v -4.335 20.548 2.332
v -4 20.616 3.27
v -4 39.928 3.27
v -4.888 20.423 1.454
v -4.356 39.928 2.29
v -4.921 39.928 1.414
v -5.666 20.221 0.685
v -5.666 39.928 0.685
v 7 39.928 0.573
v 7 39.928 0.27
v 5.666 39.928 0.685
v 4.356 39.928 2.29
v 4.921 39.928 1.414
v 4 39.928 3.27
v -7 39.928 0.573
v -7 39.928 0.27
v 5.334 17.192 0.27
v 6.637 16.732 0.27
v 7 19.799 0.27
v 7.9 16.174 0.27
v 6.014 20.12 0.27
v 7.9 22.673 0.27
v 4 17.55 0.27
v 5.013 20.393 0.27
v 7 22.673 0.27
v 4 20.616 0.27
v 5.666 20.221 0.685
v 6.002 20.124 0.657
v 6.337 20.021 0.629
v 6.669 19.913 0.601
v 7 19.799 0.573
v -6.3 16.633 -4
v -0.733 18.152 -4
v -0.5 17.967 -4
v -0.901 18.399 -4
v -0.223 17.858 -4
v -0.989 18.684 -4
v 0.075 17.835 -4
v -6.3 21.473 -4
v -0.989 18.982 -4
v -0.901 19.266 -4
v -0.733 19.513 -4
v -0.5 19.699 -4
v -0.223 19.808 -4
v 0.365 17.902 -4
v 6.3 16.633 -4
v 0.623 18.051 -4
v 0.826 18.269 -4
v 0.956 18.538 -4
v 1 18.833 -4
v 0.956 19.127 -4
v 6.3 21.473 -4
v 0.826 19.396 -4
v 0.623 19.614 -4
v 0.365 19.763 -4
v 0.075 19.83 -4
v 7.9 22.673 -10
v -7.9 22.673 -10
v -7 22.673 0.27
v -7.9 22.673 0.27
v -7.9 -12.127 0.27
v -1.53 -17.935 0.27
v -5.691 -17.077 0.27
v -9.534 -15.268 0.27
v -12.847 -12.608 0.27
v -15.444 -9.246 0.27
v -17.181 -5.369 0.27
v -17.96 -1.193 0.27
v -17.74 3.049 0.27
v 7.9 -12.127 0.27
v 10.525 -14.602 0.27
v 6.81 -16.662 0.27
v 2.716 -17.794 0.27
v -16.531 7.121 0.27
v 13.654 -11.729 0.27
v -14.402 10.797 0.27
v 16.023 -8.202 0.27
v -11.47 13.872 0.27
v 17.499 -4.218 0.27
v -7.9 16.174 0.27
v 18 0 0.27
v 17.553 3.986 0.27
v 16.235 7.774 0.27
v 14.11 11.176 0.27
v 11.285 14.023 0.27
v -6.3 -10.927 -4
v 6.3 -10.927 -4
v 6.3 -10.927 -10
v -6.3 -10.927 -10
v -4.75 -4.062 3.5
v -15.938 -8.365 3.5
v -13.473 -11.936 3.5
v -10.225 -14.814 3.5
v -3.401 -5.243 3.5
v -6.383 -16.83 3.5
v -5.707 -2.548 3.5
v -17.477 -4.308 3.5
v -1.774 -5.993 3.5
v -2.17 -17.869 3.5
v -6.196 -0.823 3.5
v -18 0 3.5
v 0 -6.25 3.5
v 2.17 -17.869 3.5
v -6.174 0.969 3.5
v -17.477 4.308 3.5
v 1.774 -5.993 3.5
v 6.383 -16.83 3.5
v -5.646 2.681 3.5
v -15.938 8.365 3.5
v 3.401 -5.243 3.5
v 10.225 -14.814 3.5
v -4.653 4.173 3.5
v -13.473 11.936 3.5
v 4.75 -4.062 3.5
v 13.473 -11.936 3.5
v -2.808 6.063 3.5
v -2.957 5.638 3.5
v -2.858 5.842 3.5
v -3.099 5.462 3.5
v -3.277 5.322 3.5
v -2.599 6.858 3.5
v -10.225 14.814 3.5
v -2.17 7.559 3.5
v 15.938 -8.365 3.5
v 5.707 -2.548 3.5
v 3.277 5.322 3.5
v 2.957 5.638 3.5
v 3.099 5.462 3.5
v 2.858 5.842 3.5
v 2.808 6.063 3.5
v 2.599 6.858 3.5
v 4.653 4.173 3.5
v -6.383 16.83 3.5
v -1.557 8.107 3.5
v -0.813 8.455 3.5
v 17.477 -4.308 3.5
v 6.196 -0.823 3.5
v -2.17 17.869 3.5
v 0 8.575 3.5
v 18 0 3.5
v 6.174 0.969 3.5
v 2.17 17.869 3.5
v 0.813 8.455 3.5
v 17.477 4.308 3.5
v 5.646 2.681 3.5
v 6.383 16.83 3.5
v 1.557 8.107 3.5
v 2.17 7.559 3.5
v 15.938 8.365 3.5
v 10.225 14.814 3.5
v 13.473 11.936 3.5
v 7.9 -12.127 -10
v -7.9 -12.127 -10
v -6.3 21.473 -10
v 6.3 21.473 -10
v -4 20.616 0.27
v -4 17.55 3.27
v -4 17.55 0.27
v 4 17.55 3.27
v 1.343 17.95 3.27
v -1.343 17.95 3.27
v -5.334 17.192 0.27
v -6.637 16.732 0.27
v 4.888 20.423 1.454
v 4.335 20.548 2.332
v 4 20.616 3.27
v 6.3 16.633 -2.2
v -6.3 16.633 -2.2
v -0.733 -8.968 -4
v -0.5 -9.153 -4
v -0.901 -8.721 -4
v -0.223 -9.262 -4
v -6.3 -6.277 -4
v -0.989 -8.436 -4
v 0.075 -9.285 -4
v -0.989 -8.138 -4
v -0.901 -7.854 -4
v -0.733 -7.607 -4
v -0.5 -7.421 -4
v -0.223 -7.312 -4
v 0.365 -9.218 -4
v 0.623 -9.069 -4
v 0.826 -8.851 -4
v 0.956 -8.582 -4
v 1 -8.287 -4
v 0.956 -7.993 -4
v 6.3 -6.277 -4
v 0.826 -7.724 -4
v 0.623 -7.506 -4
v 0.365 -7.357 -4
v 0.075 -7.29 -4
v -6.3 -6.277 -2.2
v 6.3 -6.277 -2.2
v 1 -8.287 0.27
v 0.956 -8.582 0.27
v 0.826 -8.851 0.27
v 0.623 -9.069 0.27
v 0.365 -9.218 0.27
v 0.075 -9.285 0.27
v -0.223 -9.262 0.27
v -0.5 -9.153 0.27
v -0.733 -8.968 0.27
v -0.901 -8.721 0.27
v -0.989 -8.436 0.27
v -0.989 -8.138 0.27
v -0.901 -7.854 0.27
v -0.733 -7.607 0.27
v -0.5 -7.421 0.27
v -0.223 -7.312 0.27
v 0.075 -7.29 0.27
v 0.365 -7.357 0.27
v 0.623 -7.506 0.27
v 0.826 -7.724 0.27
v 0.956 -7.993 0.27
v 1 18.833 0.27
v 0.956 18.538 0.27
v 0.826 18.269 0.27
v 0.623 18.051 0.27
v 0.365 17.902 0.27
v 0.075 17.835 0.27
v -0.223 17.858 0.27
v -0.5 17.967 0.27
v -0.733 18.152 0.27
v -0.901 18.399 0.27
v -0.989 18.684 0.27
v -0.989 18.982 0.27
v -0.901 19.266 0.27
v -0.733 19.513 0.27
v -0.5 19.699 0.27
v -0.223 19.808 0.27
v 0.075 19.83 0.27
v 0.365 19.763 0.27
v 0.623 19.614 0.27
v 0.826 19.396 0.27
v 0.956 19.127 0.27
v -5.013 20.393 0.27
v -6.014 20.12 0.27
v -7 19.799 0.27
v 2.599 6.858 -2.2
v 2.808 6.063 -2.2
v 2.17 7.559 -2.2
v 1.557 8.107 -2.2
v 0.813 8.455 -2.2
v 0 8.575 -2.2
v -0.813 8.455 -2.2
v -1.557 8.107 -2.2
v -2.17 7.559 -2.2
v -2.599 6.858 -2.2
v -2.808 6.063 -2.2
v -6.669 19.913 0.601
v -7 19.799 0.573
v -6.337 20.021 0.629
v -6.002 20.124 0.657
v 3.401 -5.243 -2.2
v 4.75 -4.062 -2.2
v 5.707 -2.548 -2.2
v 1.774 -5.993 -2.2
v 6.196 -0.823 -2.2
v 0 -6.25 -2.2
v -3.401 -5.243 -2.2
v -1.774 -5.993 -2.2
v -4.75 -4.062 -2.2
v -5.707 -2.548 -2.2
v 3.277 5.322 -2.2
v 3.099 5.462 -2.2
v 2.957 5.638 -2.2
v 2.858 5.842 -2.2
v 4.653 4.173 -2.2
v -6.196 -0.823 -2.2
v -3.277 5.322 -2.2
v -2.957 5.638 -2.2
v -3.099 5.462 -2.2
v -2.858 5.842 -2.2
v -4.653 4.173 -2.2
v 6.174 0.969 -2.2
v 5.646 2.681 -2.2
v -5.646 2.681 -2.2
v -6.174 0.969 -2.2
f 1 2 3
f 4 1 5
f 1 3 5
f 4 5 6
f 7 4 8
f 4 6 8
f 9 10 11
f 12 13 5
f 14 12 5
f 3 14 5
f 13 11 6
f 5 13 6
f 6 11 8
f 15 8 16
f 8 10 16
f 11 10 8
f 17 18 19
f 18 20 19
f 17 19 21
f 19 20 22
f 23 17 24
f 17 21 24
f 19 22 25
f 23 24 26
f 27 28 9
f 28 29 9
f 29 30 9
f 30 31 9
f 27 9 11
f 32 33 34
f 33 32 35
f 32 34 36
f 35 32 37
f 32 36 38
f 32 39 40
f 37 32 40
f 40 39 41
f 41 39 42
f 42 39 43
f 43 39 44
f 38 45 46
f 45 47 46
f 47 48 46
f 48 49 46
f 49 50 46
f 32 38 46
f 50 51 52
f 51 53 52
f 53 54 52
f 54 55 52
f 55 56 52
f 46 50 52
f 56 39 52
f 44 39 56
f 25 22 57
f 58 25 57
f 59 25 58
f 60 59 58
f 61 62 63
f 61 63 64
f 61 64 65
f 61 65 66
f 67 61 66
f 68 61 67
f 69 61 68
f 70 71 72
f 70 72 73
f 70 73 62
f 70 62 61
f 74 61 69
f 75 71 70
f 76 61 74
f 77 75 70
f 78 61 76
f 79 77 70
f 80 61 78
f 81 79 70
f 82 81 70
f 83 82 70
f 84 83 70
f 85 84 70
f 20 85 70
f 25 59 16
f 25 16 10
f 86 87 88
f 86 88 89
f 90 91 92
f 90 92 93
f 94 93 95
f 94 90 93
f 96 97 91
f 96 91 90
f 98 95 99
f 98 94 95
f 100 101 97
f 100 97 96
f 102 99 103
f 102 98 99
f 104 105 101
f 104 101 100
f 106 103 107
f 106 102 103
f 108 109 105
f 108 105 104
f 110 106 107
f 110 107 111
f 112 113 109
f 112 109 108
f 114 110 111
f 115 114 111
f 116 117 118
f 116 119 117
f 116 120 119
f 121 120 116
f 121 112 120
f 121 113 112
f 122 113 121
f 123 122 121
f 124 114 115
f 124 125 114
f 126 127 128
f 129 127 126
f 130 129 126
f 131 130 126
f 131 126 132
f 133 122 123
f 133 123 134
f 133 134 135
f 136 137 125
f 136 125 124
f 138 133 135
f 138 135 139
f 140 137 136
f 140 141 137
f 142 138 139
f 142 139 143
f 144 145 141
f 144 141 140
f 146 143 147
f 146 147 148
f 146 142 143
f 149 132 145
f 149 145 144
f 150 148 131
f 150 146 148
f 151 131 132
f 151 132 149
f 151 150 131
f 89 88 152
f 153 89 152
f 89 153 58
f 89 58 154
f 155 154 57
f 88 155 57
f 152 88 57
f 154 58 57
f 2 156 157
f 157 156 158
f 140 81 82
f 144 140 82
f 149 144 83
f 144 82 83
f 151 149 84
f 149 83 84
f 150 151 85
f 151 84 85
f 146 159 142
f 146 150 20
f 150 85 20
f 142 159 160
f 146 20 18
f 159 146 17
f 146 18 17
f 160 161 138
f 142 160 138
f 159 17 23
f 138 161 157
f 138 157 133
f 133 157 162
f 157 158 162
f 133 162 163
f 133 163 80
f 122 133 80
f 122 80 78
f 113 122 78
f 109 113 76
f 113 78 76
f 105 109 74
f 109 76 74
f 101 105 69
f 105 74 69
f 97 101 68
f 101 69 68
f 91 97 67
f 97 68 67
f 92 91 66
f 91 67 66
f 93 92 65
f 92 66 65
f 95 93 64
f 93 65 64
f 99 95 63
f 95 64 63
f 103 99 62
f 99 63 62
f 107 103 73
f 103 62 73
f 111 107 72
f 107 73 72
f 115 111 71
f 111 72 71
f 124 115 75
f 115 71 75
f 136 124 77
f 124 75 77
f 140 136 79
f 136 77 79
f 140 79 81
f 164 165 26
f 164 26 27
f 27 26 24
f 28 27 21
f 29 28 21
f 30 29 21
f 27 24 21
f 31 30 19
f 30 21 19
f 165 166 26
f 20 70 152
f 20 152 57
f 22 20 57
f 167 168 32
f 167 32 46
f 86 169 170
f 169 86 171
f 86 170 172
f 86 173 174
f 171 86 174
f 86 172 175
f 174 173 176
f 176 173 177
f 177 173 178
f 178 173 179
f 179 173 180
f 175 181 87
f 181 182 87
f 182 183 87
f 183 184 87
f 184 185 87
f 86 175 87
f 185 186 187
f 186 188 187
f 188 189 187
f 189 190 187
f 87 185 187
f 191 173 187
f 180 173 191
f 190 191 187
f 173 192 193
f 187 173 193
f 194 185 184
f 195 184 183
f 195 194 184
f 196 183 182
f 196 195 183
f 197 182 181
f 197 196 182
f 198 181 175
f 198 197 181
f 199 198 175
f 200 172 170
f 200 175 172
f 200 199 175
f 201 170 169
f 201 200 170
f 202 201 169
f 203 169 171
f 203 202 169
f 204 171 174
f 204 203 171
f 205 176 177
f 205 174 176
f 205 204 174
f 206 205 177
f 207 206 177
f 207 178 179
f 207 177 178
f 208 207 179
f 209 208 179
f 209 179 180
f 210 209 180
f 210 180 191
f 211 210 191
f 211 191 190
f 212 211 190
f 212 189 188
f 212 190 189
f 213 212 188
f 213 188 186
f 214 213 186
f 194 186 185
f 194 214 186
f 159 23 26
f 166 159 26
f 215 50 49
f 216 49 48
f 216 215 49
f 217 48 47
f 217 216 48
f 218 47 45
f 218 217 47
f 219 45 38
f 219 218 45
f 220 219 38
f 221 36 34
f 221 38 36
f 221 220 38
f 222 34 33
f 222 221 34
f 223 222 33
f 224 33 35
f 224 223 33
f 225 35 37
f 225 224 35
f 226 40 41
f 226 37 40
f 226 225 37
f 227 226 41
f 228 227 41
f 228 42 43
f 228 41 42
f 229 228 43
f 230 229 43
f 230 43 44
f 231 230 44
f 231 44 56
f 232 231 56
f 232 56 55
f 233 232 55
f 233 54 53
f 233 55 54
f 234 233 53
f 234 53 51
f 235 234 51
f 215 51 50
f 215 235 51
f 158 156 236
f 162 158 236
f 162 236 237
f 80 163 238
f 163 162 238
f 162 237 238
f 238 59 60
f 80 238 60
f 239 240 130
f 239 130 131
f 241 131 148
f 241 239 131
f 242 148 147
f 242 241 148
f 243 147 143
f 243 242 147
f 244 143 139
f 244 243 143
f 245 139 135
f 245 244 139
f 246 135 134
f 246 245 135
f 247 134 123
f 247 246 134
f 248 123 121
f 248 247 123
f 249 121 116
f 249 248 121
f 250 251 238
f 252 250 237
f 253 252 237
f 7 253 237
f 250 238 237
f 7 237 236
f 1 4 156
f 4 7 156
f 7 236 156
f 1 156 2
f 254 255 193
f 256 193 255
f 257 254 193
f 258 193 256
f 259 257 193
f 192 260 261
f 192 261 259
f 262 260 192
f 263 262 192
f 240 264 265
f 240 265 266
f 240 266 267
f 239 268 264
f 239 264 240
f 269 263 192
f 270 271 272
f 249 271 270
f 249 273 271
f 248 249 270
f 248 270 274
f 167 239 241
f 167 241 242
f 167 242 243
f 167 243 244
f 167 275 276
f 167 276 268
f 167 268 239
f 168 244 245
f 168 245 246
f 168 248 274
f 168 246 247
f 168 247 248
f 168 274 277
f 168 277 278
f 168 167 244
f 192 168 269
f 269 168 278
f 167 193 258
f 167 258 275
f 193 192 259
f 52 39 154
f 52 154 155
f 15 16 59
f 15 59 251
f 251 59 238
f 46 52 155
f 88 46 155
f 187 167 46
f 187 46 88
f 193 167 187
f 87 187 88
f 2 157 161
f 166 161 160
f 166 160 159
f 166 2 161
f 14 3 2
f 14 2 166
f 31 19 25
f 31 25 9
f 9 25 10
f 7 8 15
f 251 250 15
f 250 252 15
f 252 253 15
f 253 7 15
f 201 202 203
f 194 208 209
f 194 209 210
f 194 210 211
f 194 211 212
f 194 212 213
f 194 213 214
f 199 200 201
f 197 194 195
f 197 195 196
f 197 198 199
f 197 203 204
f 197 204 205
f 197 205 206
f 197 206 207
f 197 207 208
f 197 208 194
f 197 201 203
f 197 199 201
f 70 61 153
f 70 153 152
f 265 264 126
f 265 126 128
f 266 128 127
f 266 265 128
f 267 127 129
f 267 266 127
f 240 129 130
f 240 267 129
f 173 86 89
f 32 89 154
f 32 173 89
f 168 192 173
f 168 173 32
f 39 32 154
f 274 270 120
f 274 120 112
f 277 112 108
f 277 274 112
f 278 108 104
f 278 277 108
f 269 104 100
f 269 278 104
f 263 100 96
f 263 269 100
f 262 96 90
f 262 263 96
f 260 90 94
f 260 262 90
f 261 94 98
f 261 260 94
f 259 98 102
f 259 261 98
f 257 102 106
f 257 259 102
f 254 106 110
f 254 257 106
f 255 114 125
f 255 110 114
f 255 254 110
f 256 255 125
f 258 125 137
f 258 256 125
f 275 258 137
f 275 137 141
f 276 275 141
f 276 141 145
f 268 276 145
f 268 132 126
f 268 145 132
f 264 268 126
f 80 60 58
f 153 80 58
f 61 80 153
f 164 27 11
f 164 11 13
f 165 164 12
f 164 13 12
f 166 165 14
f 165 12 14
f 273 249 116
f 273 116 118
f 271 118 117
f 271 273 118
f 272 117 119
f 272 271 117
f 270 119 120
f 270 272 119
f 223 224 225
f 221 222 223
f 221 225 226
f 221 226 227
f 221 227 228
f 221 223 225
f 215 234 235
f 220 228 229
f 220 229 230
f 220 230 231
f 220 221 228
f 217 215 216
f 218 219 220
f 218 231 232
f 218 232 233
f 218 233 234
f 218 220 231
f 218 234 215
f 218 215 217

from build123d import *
from build123d.topology import SkipClean

# Parameters (mm, degrees)
CROQUIS1_R                 = 18
SALIENTE_EXTRUIR1_DEPTH    = 3.5
SALIENTE_EXTRUIR5_DEPTH    = 3.27
CORTAR_EXTRUIR4_REACH      = 62.83
CORTAR_EXTRUIR4_END_RADIUS = 18
CROQUIS5_W                 = 14
CROQUIS5_H                 = 0.27
CORTAR_EXTRUIR2_DEPTH      = 21
CORTAR_EXTRUIR5_DEPTH      = 10
SALIENTE_EXTRUIR6_START    = -2.2
SALIENTE_EXTRUIR6_DEPTH    = 2.2
CORTAR_EXTRUIR8_START      = 0.27
CROQUIS8_R                 = 18
CORTAR_EXTRUIR8_DEPTH      = 0.27
SALIENTE_EXTRUIR7_START    = 2.47
SALIENTE_EXTRUIR7_DEPTH    = 2.47
SALIENTE_EXTRUIR9_DEPTH    = 10
CORTAR_EXTRUIR9_START      = 10
CORTAR_EXTRUIR9_DEPTH      = 10
CROQUIS13_W                = 12.6
CROQUIS13_H                = 4.84
CROQUIS13_H_2              = 4.65
SALIENTE_EXTRUIR10_DEPTH   = 4
CROQUIS12_R                = 1
CORTAR_EXTRUIR10_DEPTH     = 18.85


with BuildPart() as part:
    # Croquis1 → Saliente-Extruir1 (new body)
    with BuildSketch(Plane.XY):
        Circle(CROQUIS1_R)
    extrude(amount=SALIENTE_EXTRUIR1_DEPTH)

    # Croquis2 → Saliente-Extruir5 (add)
    with BuildSketch(Plane.XY):
        with BuildLine():
            Line((4, 39.111635425), (4, 20.615528128))
            ThreePointArc((4, 20.615528128), (5.515132245, 20.262855582), (7, 19.798989873))
            Line((7, 19.798989873), (7, 39.928035252))
            Line((7, 39.928035252), (4, 39.928035252))
            Line((4, 39.928035252), (4, 39.111635425))
        make_face()
        with BuildLine():
            Line((-4, 20.615528128), (-4, 17.549928775))
            ThreePointArc((-4, 17.549928775), (0, 18), (4, 17.549928775))
            Line((4, 17.549928775), (4, 20.615528128))
            ThreePointArc((4, 20.615528128), (0, 21), (-4, 20.615528128))
        make_face()
        with BuildLine():
            Line((-4, 39.111635425), (-4, 20.615528128))
            ThreePointArc((-4, 20.615528128), (0, 21), (4, 20.615528128))
            Line((4, 20.615528128), (4, 39.111635425))
            Line((4, 39.111635425), (4, 39.928035252))
            Line((4, 39.928035252), (-4, 39.928035252))
            Line((-4, 39.928035252), (-4, 39.111635425))
        make_face()
        with BuildLine():
            ThreePointArc((-7, 19.798989873), (-5.515132245, 20.262855582), (-4, 20.615528128))
            Line((-4, 20.615528128), (-4, 39.111635425))
            Line((-4, 39.111635425), (-4, 39.928035252))
            Line((-4, 39.928035252), (-7, 39.928035252))
            Line((-7, 39.928035252), (-7, 19.798989873))
        make_face()
    extrude(amount=SALIENTE_EXTRUIR5_DEPTH)

    # Cortar-Extruir4: up to this cylinder (the profile starts outside it)
    with SkipClean():  # the faces are left unmerged after this step: merging them gives an invalid solid
        cortar_extruir4_end = Plane(origin=(0, 0, 0.135), z_dir=(0, 0, -1)) * Cylinder(CORTAR_EXTRUIR4_END_RADIUS, 162.66, mode=Mode.PRIVATE)
        # Croquis5 → Cortar-Extruir4 (cut, up to the surface)
        with BuildSketch(Plane(origin=(0, 40, 0), x_dir=(1, 0, 0), z_dir=(0, 1, 0)), mode=Mode.PRIVATE) as cortar_extruir4_sk1:
            with Locations((0, -0.135)):
                Rectangle(CROQUIS5_W, CROQUIS5_H)
        cortar_extruir4_tool1 = extrude(cortar_extruir4_sk1.sketch, amount=-CORTAR_EXTRUIR4_REACH, mode=Mode.PRIVATE) - cortar_extruir4_end
        add(cortar_extruir4_tool1.solids().sort_by_distance((0, 40, 0.135))[0], mode=Mode.SUBTRACT)
    add(part.part.scale(1), mode=Mode.REPLACE)  # the faces are merged on a copy

    # Croquis4 → Cortar-Extruir2 (cut)
    with BuildSketch(Plane(origin=(0, 40, 0), x_dir=(1, 0, 0), z_dir=(0, 1, 0))):
        with BuildLine():
            Line((-5.666001987, -0.685021683), (-7, -0.573296162))
            Line((-7, -0.573296162), (-7, -3.27))
            Line((-7, -3.27), (-4, -3.27))
            ThreePointArc((-4, -3.27), (-4.613533351, -1.83606535), (-5.666001987, -0.685021683))
        make_face()
        with BuildLine():
            ThreePointArc((5.666001987, -0.685021683), (4.613533351, -1.83606535), (4, -3.27))
            Line((4, -3.27), (7, -3.27))
            Line((7, -3.27), (7, -0.573296162))
            Line((7, -0.573296162), (5.666001987, -0.685021683))
        make_face()
    extrude(amount=-CORTAR_EXTRUIR2_DEPTH, mode=Mode.SUBTRACT)

    # Croquis6 → Cortar-Extruir5 (cut)
    with BuildSketch(Plane.XY):
        with BuildLine():
            ThreePointArc((-3.277147796, 5.321917166), (0, -6.25), (3.277147796, 5.321917166))
            ThreePointArc((3.277147796, 5.321917166), (2.956843582, 5.638101589), (2.807637471, 6.062724851))
            ThreePointArc((2.807637471, 6.062724851), (0, 8.575), (-2.807637471, 6.062724851))
            ThreePointArc((-2.807637471, 6.062724851), (-2.956843582, 5.638101589), (-3.277147796, 5.321917166))
        make_face()
    extrude(amount=CORTAR_EXTRUIR5_DEPTH, mode=Mode.SUBTRACT)

    # Croquis7 → Saliente-Extruir6 (add)
    with SkipClean():  # the faces are left unmerged after this step: merging them gives an invalid solid
        with BuildSketch(Plane.XY.offset(SALIENTE_EXTRUIR6_START)):
            with BuildLine():
                ThreePointArc((-5.596720258, 7.364728261), (0, -9.25), (5.596720258, 7.364728261))
                ThreePointArc((5.596720258, 7.364728261), (0, 11.575), (-5.596720258, 7.364728261))
            make_face()
            with BuildLine():
                ThreePointArc((-3.277147796, 5.321917166), (0, -6.25), (3.277147796, 5.321917166))
                ThreePointArc((3.277147796, 5.321917166), (2.956843582, 5.638101589), (2.807637471, 6.062724851))
                ThreePointArc((2.807637471, 6.062724851), (0, 8.575), (-2.807637471, 6.062724851))
                ThreePointArc((-2.807637471, 6.062724851), (-2.956843582, 5.638101589), (-3.277147796, 5.321917166))
            make_face(mode=Mode.SUBTRACT)
        extrude(amount=SALIENTE_EXTRUIR6_DEPTH)

    # Croquis8 → Cortar-Extruir8 (cut)
    with BuildSketch(Plane(origin=(0, 0, 0.27), x_dir=(-1, 0, 0), z_dir=(0, 0, -1)).offset(CORTAR_EXTRUIR8_START)):
        with Locations(Location((0, 0, 0), (0, 0, 77.160411593))):
            Circle(CROQUIS8_R)
        with BuildLine():
            ThreePointArc((-5.596720258, 7.364728261), (0, -9.25), (5.596720258, 7.364728261))
            ThreePointArc((5.596720258, 7.364728261), (0, 11.575), (-5.596720258, 7.364728261))
        make_face(mode=Mode.SUBTRACT)
    extrude(amount=-CORTAR_EXTRUIR8_DEPTH, mode=Mode.SUBTRACT)

    # Croquis9 → Saliente-Extruir7 (add)
    with BuildSketch(Plane(origin=(0, 0, 0.27), x_dir=(-1, 0, 0), z_dir=(0, 0, -1)).offset(SALIENTE_EXTRUIR7_START)):
        with BuildLine():
            Line((-7.9, -4.81170448), (-7.9, -12.127391994))
            Line((-7.9, -12.127391994), (7.9, -12.127391994))
            Line((7.9, -12.127391994), (7.9, -4.81170448))
            ThreePointArc((7.9, -4.81170448), (0, -9.25), (-7.9, -4.81170448))
        make_face()
        with BuildLine():
            Line((-7.9, 22.672608006), (-7.9, 4.81170448))
            ThreePointArc((-7.9, 4.81170448), (-6.868030798, 6.196180514), (-5.596720258, 7.364728261))
            ThreePointArc((-5.596720258, 7.364728261), (0, 11.575), (5.596720258, 7.364728261))
            ThreePointArc((5.596720258, 7.364728261), (6.868030798, 6.196180514), (7.9, 4.81170448))
            Line((7.9, 4.81170448), (7.9, 22.672608006))
            Line((7.9, 22.672608006), (-7.9, 22.672608006))
        make_face()
    extrude(amount=-SALIENTE_EXTRUIR7_DEPTH)

    # Croquis10 → Saliente-Extruir9 (add)
    with BuildSketch(Plane.XY):
        Polygon((-7.9, -12.127391994), (0, -12.127391994), (7.9, -12.127391994), (7.9, -10.927391994), (7.9, 21.472608006), (7.9, 22.672608006), (-7.9, 22.672608006), (-7.9, 21.472608006), (-7.9, 5.272608006), (-7.9, -10.927391994), align=None)
        Polygon((-6.3, -6.277391994), (-6.3, 0), (-6.3, 5.272608006), (-6.3, 16.532608006), (-6.3, 19.872608006), (-6.3, 21.472608006), (6.3, 21.472608006), (6.3, 19.872608006), (6.3, 16.532608006), (6.3, -6.277391994), (6.3, -9.327391994), (6.3, -10.927391994), (0, -10.927391994), (-6.3, -10.927391994), (-6.3, -9.327391994), align=None, mode=Mode.SUBTRACT)
    extrude(amount=-SALIENTE_EXTRUIR9_DEPTH)

    # Croquis11 → Cortar-Extruir9 (cut)
    with BuildSketch(Plane(origin=(0, 0, 0.27), x_dir=(-1, 0, 0), z_dir=(0, 0, -1)).offset(CORTAR_EXTRUIR9_START)):
        with BuildLine():
            Line((7.9, 4.81170448), (7.9, -4.81170448))
            ThreePointArc((7.9, -4.81170448), (9.25, 0), (7.9, 4.81170448))
        make_face()
        with BuildLine():
            Line((-7.9, -4.81170448), (-7.9, 4.81170448))
            ThreePointArc((-7.9, 4.81170448), (-9.25, 0), (-7.9, -4.81170448))
        make_face()
    extrude(amount=-CORTAR_EXTRUIR9_DEPTH, mode=Mode.SUBTRACT)

    # Croquis13 → Saliente-Extruir10 (add)
    with BuildSketch(Plane.XY):
        with Locations((0, 19.052608006)):
            Rectangle(CROQUIS13_W, CROQUIS13_H)
        with Locations((0, -8.602391994)):
            Rectangle(CROQUIS13_W, CROQUIS13_H_2)
    extrude(amount=-SALIENTE_EXTRUIR10_DEPTH)

    # Croquis12 → Cortar-Extruir10 (cut)
    with BuildSketch(Plane(origin=(0, 0, 0.27), x_dir=(-1, 0, 0), z_dir=(0, 0, -1))):
        with Locations(Location((0, 18.832608006, 0), (0, 0, 180))):
            Circle(CROQUIS12_R)
        with Locations(Location((0, -8.287391994, 0), (0, 0, 180))):
            Circle(CROQUIS12_R)
    extrude(amount=CORTAR_EXTRUIR10_DEPTH, mode=Mode.SUBTRACT)


solid = part.part
